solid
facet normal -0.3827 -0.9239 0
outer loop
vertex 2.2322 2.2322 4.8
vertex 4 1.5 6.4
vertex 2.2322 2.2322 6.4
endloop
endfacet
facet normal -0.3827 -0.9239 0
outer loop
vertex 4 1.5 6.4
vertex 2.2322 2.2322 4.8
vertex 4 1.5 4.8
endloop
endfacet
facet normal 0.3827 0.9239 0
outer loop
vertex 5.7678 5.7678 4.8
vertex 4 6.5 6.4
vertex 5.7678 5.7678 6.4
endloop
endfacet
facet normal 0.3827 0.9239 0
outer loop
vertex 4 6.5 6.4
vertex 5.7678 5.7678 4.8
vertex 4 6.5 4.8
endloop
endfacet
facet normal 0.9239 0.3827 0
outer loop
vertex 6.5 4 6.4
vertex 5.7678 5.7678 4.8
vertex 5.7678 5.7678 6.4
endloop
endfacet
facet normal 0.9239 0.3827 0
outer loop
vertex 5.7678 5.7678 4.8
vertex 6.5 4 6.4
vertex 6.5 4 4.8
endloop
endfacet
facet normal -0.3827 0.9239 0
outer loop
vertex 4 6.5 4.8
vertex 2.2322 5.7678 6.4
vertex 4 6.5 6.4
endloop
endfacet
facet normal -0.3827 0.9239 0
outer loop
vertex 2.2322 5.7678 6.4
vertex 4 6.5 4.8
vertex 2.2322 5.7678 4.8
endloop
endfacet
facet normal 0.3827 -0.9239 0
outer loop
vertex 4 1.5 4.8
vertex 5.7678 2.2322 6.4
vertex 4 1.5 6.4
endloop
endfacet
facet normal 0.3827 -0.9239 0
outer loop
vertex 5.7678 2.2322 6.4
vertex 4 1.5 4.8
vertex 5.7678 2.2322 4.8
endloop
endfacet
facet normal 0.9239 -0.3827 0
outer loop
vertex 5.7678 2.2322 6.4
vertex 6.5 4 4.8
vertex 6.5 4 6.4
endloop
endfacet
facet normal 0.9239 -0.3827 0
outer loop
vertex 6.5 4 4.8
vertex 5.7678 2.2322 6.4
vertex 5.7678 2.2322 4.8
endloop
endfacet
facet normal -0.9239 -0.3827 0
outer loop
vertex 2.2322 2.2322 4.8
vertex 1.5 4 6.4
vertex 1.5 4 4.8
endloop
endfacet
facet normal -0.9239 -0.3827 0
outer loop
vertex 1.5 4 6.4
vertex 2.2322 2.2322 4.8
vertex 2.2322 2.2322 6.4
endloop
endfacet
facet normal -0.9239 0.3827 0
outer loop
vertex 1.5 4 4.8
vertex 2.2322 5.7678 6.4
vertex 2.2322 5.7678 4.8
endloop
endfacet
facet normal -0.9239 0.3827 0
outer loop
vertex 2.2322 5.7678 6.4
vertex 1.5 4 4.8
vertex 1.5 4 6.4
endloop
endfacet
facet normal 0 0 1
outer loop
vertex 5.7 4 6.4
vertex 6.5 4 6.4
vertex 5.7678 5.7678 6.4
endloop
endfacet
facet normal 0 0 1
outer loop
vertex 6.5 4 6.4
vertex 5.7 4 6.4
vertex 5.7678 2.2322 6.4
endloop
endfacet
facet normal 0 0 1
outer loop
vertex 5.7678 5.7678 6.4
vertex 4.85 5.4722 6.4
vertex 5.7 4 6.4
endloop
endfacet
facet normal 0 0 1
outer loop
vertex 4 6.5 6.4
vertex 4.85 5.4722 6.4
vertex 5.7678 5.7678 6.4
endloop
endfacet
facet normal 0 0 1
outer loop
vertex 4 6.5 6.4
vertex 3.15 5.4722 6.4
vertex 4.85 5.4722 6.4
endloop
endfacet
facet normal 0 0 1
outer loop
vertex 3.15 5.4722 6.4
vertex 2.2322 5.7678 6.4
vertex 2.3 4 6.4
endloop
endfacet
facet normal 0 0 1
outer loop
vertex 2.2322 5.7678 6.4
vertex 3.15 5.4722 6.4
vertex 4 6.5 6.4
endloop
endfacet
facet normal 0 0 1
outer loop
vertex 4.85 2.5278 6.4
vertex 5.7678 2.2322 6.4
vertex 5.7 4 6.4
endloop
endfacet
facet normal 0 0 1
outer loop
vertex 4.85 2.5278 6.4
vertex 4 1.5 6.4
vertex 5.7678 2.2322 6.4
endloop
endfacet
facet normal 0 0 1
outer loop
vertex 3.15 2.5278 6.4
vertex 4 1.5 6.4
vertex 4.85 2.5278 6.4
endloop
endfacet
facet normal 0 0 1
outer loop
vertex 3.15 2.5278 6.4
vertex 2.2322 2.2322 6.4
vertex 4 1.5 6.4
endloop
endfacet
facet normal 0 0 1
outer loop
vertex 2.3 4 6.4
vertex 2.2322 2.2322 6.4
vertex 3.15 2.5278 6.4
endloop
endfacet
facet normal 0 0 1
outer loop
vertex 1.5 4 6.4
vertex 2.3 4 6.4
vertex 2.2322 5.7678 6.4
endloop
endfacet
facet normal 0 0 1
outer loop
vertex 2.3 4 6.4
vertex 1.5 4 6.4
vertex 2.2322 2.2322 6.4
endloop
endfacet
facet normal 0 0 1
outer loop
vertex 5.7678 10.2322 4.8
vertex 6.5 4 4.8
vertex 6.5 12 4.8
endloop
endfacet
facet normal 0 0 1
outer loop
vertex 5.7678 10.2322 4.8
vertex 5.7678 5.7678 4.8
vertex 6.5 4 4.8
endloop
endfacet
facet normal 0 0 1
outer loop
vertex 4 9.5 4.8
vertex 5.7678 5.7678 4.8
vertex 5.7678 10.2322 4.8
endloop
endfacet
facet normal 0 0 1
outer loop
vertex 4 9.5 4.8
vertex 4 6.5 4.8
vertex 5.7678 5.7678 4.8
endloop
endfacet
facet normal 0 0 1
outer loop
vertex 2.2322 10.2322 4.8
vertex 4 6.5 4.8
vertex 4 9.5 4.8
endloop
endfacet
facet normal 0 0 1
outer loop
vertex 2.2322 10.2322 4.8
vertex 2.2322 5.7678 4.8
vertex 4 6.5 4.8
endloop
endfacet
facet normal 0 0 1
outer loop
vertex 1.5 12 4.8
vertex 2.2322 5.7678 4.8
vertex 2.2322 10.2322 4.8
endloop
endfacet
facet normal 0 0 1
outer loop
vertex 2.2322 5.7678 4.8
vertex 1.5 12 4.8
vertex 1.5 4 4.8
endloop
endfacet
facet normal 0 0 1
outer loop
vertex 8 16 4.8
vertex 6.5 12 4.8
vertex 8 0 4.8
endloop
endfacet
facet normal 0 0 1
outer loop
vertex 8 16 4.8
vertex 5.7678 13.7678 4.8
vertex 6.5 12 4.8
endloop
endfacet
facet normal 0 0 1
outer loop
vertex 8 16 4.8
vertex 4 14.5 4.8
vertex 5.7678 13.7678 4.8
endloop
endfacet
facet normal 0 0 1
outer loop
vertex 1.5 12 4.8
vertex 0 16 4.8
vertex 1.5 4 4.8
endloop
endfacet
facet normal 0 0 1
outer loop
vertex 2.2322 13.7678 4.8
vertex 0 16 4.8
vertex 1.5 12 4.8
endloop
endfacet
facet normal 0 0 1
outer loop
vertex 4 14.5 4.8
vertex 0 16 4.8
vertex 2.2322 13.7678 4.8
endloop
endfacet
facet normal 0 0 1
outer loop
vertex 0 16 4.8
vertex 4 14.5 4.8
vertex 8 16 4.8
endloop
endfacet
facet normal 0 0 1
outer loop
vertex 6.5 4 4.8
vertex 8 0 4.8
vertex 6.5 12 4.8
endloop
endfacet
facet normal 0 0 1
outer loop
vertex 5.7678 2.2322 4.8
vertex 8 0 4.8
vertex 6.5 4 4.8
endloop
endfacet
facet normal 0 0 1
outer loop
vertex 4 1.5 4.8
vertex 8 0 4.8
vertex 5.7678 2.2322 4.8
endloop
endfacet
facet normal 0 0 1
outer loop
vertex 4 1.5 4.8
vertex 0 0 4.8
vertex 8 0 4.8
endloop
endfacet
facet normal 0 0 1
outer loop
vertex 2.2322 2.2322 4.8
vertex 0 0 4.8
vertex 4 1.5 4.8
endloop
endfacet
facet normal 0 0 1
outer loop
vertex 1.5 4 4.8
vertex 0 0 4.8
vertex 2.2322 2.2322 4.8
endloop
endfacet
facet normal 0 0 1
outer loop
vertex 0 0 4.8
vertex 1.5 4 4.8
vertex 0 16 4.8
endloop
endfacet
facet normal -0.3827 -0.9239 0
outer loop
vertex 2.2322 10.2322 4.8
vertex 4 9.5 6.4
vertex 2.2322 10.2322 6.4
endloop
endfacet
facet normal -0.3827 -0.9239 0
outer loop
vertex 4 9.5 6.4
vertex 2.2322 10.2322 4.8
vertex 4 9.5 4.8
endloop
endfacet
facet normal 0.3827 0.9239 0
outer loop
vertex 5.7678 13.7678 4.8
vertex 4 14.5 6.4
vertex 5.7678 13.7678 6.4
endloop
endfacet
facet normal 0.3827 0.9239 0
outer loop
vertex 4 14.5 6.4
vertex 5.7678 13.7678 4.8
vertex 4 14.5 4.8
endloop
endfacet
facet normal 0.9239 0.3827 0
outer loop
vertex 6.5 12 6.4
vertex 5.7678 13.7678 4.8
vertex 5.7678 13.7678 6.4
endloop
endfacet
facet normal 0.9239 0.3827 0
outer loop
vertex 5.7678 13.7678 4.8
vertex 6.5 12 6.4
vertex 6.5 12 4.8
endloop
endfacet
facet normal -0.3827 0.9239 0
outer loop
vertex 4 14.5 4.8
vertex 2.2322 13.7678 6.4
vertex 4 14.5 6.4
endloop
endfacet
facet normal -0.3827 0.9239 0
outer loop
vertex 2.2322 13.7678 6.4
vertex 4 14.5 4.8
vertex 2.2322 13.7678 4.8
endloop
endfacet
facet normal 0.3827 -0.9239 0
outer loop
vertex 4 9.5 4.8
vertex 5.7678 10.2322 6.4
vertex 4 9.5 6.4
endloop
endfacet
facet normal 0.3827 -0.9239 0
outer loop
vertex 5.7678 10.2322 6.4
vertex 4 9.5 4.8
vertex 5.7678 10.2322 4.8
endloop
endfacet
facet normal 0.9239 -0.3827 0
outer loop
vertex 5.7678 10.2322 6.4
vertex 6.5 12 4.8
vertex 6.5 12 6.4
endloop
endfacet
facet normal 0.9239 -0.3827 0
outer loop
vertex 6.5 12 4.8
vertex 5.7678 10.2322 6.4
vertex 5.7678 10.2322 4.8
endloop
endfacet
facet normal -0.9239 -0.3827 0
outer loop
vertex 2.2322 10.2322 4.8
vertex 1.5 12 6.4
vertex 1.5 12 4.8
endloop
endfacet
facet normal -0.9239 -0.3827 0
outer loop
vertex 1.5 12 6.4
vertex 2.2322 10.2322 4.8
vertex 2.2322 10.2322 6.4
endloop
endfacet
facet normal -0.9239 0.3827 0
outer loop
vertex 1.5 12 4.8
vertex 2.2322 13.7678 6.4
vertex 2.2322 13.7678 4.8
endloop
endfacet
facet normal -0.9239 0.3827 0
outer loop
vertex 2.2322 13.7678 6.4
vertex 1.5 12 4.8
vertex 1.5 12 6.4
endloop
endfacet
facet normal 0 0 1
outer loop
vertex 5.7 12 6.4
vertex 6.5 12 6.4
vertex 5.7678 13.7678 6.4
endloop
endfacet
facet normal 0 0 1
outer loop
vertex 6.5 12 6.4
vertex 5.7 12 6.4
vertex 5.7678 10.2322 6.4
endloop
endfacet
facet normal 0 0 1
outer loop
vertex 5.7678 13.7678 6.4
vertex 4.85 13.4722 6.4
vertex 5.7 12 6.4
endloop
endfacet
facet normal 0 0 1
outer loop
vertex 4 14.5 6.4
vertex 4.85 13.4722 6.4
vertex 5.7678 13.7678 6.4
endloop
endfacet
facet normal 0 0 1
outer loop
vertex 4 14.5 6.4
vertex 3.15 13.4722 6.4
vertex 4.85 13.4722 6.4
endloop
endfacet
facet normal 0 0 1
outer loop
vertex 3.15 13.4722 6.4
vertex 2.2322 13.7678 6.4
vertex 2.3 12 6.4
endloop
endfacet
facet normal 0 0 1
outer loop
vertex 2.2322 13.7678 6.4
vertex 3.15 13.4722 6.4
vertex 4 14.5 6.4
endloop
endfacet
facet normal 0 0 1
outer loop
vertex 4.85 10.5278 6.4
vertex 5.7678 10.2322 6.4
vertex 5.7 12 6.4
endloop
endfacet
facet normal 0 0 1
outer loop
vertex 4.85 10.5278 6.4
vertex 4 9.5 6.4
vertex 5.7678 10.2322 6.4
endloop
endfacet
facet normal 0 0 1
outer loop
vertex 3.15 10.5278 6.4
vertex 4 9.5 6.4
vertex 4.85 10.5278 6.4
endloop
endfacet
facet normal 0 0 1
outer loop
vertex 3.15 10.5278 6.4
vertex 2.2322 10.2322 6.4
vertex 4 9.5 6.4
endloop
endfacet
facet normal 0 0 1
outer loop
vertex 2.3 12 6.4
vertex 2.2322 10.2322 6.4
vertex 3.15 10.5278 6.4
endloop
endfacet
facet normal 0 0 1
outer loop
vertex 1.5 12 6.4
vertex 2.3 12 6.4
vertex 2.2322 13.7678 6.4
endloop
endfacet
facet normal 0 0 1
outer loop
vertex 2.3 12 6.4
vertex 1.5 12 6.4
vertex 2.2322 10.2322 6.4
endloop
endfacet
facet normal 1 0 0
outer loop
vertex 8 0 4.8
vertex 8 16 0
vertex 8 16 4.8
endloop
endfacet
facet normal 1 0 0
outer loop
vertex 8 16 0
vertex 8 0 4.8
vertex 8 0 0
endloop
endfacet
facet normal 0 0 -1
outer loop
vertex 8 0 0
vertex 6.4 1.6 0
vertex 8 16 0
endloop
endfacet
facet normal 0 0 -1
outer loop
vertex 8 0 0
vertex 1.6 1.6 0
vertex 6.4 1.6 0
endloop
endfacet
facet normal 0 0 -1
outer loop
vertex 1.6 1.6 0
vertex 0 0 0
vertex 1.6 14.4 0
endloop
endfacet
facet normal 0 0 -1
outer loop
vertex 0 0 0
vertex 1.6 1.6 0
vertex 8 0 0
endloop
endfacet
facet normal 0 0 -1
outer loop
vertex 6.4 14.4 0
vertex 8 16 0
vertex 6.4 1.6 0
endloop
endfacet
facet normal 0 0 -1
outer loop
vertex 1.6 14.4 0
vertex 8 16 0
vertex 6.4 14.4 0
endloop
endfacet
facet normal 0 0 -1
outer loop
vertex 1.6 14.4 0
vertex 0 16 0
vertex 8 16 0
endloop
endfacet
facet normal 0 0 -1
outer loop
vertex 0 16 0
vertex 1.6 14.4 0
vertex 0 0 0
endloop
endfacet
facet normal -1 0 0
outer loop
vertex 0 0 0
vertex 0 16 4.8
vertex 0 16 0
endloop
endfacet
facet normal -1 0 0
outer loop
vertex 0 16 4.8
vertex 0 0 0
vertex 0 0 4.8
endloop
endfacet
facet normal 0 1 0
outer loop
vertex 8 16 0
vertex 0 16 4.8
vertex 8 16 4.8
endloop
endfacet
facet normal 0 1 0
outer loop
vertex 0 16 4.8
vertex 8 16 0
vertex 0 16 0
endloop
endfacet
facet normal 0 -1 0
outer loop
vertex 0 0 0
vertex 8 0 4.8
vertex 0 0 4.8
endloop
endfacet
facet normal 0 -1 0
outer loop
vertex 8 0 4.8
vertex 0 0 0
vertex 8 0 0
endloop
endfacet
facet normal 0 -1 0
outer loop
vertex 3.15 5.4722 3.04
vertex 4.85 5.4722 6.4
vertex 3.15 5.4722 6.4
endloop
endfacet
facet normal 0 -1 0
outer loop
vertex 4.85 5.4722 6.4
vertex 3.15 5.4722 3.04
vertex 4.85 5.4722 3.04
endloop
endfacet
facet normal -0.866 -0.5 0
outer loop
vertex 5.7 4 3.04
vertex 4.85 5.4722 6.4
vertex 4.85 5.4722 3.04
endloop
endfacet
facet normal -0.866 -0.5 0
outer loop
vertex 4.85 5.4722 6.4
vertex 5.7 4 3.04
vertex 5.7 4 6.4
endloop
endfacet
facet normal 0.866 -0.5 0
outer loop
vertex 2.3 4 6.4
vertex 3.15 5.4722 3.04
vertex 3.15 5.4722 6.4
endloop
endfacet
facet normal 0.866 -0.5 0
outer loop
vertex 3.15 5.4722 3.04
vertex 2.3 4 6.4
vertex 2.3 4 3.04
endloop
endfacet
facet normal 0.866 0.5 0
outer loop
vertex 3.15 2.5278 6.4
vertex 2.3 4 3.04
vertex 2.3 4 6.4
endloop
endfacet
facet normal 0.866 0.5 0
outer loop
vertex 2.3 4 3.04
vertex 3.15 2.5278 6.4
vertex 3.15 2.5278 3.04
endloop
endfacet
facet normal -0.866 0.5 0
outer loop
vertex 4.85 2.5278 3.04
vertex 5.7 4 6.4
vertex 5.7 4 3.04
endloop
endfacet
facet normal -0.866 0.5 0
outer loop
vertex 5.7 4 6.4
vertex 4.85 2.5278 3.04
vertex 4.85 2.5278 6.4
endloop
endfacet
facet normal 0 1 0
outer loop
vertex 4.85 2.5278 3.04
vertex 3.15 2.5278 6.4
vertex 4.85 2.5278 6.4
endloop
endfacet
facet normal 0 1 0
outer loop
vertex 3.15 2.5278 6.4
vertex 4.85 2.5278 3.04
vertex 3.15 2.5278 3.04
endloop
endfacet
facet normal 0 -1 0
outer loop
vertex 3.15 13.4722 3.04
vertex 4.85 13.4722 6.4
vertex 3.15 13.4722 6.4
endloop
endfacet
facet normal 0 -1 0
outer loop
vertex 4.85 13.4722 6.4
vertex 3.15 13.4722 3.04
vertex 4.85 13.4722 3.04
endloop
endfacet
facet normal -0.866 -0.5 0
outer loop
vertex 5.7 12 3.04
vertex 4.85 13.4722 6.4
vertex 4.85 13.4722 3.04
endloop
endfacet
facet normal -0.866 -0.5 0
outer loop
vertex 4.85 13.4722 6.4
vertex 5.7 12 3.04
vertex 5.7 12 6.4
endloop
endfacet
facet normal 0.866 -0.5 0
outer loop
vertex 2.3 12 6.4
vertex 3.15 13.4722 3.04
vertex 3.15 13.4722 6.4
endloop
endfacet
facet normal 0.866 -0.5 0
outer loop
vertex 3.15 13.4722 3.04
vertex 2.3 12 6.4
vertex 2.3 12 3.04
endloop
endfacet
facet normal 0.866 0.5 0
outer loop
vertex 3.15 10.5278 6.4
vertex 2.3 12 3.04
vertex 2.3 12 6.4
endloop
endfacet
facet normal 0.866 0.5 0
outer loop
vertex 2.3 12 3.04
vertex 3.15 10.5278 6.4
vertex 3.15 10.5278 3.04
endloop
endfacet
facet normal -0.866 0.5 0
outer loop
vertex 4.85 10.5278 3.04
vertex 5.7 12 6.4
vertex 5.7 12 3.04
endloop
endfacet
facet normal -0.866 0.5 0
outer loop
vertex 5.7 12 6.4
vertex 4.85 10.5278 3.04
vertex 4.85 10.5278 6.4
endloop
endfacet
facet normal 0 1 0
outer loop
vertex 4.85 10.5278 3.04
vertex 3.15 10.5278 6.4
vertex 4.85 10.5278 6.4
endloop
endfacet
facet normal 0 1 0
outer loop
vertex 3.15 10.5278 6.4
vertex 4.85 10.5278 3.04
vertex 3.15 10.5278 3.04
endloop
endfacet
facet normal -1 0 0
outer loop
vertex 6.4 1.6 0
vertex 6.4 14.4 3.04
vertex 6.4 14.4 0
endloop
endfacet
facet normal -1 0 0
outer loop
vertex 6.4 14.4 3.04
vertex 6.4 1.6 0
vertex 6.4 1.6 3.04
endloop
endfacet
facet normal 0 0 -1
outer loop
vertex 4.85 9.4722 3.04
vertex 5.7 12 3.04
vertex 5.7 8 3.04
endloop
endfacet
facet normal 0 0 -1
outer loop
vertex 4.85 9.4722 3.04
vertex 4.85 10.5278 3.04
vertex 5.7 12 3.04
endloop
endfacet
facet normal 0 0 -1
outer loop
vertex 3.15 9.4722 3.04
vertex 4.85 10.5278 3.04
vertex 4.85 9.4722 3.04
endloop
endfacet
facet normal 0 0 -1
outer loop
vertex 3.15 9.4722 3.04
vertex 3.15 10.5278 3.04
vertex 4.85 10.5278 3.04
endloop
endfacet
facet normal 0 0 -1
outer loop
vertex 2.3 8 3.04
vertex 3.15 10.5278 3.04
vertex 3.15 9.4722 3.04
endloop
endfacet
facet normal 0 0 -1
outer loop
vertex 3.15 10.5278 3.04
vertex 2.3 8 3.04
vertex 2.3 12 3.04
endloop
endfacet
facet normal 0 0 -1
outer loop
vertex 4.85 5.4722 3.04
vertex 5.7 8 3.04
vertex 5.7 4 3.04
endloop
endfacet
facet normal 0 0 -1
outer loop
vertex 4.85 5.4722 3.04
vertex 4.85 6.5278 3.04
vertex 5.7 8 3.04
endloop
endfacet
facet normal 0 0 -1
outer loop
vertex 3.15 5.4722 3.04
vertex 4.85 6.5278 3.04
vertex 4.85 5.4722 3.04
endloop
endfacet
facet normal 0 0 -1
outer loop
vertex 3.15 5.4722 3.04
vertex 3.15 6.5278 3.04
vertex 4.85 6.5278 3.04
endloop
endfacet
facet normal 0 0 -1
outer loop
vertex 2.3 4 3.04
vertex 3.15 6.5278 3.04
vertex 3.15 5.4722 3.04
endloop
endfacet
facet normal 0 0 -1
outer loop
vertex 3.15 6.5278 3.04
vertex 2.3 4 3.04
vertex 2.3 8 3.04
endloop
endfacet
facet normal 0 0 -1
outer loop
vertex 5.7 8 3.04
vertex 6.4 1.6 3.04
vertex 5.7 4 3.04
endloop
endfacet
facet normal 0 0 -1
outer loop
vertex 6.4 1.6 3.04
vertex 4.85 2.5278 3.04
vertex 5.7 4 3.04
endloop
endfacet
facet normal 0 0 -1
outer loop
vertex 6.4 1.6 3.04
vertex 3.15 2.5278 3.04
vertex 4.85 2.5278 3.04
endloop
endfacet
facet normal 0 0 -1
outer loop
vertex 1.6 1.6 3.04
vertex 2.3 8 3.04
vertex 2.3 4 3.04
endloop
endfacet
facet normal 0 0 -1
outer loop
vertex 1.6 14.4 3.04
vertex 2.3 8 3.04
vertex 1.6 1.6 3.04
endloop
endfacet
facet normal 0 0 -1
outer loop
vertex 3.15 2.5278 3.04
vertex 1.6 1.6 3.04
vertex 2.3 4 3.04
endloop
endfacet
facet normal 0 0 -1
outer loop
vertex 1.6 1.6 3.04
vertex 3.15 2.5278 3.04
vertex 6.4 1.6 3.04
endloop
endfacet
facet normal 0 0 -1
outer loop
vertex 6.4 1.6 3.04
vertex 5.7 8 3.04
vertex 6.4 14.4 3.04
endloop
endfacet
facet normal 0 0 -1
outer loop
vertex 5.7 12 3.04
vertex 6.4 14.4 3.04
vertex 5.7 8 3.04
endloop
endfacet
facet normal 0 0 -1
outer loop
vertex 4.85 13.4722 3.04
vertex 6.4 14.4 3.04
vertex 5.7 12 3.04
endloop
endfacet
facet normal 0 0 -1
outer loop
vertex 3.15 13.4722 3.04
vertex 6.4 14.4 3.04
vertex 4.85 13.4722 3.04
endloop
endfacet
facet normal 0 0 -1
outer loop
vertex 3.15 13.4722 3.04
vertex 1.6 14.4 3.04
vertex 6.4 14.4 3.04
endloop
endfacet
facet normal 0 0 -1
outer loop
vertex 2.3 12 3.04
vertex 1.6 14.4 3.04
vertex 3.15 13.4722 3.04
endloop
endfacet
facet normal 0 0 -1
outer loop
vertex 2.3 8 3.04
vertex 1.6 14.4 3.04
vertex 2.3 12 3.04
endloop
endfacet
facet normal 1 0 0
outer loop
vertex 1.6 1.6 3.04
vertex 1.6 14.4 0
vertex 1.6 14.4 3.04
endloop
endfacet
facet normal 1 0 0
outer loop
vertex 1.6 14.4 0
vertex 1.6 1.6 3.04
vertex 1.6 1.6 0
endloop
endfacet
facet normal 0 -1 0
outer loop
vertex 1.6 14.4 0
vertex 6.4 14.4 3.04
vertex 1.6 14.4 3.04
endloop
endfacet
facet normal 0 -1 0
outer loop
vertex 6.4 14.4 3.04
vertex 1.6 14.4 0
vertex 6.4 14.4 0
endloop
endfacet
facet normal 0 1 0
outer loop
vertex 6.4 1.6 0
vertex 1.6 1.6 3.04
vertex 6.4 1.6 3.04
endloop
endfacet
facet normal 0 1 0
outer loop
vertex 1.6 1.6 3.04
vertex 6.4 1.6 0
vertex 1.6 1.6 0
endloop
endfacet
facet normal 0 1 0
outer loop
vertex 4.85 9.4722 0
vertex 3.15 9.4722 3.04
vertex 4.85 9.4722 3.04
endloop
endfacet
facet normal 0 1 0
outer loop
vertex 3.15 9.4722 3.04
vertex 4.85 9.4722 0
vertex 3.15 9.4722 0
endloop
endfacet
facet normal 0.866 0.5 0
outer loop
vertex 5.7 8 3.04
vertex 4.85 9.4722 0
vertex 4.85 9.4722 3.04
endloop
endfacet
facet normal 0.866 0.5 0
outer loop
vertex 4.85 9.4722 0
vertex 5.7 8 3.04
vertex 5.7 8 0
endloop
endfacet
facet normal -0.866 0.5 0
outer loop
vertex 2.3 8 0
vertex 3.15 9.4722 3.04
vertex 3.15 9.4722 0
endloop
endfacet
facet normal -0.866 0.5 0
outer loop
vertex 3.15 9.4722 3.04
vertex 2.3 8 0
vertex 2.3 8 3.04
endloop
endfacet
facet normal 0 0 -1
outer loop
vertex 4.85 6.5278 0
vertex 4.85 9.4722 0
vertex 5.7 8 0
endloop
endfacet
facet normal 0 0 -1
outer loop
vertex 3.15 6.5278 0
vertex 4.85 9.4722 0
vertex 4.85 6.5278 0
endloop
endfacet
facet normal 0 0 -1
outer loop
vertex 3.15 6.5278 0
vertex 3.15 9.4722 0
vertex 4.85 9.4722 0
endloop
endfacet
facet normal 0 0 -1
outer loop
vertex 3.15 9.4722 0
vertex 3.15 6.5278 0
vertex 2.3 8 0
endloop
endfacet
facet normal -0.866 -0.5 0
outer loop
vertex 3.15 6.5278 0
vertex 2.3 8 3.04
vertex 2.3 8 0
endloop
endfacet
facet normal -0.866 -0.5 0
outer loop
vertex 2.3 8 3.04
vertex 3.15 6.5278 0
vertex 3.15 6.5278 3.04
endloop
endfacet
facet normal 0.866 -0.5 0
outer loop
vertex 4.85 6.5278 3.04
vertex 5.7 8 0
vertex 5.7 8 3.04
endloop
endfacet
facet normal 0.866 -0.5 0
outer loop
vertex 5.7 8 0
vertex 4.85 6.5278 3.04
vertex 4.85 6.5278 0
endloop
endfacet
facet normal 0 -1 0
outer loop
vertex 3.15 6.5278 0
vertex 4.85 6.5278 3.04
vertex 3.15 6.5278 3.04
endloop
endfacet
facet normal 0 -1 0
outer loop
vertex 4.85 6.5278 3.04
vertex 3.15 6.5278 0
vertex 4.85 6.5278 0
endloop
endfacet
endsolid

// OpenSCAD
lego = 1.6;

wall = 1 * lego;
toler = 1;

stud_diam = 3 * lego +.2 * toler;
stud_inner = 2 * lego +.2 * toler;
stud_height = 1 * lego;

brick_one = 5 * lego;
inner_one = brick_one - (wall*2);

narrow_brick(2,3);


module narrow_brick(pegs=2, height=3) {
    difference() {
        union() {
            cube([brick_one, brick_one*pegs, lego*height]);
            for (spot = [1 : pegs]) color([1,0,0]) translate([brick_one/2,brick_one*(spot-.5),lego*height]) cylinder(d=stud_diam, stud_height);
        }
        color([0,0,1]) translate([wall,wall,0]) cube([inner_one, inner_one+(pegs-1)*brick_one, lego*height - wall*1.1]);
        for (spot = [1 : pegs]) color([1,1,0]) translate([brick_one/2,brick_one*(spot-.5),lego*height-wall*2]) cylinder(d=stud_inner, stud_height+wall*2);
    }
    for (spot = [1 : pegs-1]) color([0,1,0]) translate([brick_one/2,brick_one*spot,0]) cylinder(d=stud_inner, lego*height);

}
